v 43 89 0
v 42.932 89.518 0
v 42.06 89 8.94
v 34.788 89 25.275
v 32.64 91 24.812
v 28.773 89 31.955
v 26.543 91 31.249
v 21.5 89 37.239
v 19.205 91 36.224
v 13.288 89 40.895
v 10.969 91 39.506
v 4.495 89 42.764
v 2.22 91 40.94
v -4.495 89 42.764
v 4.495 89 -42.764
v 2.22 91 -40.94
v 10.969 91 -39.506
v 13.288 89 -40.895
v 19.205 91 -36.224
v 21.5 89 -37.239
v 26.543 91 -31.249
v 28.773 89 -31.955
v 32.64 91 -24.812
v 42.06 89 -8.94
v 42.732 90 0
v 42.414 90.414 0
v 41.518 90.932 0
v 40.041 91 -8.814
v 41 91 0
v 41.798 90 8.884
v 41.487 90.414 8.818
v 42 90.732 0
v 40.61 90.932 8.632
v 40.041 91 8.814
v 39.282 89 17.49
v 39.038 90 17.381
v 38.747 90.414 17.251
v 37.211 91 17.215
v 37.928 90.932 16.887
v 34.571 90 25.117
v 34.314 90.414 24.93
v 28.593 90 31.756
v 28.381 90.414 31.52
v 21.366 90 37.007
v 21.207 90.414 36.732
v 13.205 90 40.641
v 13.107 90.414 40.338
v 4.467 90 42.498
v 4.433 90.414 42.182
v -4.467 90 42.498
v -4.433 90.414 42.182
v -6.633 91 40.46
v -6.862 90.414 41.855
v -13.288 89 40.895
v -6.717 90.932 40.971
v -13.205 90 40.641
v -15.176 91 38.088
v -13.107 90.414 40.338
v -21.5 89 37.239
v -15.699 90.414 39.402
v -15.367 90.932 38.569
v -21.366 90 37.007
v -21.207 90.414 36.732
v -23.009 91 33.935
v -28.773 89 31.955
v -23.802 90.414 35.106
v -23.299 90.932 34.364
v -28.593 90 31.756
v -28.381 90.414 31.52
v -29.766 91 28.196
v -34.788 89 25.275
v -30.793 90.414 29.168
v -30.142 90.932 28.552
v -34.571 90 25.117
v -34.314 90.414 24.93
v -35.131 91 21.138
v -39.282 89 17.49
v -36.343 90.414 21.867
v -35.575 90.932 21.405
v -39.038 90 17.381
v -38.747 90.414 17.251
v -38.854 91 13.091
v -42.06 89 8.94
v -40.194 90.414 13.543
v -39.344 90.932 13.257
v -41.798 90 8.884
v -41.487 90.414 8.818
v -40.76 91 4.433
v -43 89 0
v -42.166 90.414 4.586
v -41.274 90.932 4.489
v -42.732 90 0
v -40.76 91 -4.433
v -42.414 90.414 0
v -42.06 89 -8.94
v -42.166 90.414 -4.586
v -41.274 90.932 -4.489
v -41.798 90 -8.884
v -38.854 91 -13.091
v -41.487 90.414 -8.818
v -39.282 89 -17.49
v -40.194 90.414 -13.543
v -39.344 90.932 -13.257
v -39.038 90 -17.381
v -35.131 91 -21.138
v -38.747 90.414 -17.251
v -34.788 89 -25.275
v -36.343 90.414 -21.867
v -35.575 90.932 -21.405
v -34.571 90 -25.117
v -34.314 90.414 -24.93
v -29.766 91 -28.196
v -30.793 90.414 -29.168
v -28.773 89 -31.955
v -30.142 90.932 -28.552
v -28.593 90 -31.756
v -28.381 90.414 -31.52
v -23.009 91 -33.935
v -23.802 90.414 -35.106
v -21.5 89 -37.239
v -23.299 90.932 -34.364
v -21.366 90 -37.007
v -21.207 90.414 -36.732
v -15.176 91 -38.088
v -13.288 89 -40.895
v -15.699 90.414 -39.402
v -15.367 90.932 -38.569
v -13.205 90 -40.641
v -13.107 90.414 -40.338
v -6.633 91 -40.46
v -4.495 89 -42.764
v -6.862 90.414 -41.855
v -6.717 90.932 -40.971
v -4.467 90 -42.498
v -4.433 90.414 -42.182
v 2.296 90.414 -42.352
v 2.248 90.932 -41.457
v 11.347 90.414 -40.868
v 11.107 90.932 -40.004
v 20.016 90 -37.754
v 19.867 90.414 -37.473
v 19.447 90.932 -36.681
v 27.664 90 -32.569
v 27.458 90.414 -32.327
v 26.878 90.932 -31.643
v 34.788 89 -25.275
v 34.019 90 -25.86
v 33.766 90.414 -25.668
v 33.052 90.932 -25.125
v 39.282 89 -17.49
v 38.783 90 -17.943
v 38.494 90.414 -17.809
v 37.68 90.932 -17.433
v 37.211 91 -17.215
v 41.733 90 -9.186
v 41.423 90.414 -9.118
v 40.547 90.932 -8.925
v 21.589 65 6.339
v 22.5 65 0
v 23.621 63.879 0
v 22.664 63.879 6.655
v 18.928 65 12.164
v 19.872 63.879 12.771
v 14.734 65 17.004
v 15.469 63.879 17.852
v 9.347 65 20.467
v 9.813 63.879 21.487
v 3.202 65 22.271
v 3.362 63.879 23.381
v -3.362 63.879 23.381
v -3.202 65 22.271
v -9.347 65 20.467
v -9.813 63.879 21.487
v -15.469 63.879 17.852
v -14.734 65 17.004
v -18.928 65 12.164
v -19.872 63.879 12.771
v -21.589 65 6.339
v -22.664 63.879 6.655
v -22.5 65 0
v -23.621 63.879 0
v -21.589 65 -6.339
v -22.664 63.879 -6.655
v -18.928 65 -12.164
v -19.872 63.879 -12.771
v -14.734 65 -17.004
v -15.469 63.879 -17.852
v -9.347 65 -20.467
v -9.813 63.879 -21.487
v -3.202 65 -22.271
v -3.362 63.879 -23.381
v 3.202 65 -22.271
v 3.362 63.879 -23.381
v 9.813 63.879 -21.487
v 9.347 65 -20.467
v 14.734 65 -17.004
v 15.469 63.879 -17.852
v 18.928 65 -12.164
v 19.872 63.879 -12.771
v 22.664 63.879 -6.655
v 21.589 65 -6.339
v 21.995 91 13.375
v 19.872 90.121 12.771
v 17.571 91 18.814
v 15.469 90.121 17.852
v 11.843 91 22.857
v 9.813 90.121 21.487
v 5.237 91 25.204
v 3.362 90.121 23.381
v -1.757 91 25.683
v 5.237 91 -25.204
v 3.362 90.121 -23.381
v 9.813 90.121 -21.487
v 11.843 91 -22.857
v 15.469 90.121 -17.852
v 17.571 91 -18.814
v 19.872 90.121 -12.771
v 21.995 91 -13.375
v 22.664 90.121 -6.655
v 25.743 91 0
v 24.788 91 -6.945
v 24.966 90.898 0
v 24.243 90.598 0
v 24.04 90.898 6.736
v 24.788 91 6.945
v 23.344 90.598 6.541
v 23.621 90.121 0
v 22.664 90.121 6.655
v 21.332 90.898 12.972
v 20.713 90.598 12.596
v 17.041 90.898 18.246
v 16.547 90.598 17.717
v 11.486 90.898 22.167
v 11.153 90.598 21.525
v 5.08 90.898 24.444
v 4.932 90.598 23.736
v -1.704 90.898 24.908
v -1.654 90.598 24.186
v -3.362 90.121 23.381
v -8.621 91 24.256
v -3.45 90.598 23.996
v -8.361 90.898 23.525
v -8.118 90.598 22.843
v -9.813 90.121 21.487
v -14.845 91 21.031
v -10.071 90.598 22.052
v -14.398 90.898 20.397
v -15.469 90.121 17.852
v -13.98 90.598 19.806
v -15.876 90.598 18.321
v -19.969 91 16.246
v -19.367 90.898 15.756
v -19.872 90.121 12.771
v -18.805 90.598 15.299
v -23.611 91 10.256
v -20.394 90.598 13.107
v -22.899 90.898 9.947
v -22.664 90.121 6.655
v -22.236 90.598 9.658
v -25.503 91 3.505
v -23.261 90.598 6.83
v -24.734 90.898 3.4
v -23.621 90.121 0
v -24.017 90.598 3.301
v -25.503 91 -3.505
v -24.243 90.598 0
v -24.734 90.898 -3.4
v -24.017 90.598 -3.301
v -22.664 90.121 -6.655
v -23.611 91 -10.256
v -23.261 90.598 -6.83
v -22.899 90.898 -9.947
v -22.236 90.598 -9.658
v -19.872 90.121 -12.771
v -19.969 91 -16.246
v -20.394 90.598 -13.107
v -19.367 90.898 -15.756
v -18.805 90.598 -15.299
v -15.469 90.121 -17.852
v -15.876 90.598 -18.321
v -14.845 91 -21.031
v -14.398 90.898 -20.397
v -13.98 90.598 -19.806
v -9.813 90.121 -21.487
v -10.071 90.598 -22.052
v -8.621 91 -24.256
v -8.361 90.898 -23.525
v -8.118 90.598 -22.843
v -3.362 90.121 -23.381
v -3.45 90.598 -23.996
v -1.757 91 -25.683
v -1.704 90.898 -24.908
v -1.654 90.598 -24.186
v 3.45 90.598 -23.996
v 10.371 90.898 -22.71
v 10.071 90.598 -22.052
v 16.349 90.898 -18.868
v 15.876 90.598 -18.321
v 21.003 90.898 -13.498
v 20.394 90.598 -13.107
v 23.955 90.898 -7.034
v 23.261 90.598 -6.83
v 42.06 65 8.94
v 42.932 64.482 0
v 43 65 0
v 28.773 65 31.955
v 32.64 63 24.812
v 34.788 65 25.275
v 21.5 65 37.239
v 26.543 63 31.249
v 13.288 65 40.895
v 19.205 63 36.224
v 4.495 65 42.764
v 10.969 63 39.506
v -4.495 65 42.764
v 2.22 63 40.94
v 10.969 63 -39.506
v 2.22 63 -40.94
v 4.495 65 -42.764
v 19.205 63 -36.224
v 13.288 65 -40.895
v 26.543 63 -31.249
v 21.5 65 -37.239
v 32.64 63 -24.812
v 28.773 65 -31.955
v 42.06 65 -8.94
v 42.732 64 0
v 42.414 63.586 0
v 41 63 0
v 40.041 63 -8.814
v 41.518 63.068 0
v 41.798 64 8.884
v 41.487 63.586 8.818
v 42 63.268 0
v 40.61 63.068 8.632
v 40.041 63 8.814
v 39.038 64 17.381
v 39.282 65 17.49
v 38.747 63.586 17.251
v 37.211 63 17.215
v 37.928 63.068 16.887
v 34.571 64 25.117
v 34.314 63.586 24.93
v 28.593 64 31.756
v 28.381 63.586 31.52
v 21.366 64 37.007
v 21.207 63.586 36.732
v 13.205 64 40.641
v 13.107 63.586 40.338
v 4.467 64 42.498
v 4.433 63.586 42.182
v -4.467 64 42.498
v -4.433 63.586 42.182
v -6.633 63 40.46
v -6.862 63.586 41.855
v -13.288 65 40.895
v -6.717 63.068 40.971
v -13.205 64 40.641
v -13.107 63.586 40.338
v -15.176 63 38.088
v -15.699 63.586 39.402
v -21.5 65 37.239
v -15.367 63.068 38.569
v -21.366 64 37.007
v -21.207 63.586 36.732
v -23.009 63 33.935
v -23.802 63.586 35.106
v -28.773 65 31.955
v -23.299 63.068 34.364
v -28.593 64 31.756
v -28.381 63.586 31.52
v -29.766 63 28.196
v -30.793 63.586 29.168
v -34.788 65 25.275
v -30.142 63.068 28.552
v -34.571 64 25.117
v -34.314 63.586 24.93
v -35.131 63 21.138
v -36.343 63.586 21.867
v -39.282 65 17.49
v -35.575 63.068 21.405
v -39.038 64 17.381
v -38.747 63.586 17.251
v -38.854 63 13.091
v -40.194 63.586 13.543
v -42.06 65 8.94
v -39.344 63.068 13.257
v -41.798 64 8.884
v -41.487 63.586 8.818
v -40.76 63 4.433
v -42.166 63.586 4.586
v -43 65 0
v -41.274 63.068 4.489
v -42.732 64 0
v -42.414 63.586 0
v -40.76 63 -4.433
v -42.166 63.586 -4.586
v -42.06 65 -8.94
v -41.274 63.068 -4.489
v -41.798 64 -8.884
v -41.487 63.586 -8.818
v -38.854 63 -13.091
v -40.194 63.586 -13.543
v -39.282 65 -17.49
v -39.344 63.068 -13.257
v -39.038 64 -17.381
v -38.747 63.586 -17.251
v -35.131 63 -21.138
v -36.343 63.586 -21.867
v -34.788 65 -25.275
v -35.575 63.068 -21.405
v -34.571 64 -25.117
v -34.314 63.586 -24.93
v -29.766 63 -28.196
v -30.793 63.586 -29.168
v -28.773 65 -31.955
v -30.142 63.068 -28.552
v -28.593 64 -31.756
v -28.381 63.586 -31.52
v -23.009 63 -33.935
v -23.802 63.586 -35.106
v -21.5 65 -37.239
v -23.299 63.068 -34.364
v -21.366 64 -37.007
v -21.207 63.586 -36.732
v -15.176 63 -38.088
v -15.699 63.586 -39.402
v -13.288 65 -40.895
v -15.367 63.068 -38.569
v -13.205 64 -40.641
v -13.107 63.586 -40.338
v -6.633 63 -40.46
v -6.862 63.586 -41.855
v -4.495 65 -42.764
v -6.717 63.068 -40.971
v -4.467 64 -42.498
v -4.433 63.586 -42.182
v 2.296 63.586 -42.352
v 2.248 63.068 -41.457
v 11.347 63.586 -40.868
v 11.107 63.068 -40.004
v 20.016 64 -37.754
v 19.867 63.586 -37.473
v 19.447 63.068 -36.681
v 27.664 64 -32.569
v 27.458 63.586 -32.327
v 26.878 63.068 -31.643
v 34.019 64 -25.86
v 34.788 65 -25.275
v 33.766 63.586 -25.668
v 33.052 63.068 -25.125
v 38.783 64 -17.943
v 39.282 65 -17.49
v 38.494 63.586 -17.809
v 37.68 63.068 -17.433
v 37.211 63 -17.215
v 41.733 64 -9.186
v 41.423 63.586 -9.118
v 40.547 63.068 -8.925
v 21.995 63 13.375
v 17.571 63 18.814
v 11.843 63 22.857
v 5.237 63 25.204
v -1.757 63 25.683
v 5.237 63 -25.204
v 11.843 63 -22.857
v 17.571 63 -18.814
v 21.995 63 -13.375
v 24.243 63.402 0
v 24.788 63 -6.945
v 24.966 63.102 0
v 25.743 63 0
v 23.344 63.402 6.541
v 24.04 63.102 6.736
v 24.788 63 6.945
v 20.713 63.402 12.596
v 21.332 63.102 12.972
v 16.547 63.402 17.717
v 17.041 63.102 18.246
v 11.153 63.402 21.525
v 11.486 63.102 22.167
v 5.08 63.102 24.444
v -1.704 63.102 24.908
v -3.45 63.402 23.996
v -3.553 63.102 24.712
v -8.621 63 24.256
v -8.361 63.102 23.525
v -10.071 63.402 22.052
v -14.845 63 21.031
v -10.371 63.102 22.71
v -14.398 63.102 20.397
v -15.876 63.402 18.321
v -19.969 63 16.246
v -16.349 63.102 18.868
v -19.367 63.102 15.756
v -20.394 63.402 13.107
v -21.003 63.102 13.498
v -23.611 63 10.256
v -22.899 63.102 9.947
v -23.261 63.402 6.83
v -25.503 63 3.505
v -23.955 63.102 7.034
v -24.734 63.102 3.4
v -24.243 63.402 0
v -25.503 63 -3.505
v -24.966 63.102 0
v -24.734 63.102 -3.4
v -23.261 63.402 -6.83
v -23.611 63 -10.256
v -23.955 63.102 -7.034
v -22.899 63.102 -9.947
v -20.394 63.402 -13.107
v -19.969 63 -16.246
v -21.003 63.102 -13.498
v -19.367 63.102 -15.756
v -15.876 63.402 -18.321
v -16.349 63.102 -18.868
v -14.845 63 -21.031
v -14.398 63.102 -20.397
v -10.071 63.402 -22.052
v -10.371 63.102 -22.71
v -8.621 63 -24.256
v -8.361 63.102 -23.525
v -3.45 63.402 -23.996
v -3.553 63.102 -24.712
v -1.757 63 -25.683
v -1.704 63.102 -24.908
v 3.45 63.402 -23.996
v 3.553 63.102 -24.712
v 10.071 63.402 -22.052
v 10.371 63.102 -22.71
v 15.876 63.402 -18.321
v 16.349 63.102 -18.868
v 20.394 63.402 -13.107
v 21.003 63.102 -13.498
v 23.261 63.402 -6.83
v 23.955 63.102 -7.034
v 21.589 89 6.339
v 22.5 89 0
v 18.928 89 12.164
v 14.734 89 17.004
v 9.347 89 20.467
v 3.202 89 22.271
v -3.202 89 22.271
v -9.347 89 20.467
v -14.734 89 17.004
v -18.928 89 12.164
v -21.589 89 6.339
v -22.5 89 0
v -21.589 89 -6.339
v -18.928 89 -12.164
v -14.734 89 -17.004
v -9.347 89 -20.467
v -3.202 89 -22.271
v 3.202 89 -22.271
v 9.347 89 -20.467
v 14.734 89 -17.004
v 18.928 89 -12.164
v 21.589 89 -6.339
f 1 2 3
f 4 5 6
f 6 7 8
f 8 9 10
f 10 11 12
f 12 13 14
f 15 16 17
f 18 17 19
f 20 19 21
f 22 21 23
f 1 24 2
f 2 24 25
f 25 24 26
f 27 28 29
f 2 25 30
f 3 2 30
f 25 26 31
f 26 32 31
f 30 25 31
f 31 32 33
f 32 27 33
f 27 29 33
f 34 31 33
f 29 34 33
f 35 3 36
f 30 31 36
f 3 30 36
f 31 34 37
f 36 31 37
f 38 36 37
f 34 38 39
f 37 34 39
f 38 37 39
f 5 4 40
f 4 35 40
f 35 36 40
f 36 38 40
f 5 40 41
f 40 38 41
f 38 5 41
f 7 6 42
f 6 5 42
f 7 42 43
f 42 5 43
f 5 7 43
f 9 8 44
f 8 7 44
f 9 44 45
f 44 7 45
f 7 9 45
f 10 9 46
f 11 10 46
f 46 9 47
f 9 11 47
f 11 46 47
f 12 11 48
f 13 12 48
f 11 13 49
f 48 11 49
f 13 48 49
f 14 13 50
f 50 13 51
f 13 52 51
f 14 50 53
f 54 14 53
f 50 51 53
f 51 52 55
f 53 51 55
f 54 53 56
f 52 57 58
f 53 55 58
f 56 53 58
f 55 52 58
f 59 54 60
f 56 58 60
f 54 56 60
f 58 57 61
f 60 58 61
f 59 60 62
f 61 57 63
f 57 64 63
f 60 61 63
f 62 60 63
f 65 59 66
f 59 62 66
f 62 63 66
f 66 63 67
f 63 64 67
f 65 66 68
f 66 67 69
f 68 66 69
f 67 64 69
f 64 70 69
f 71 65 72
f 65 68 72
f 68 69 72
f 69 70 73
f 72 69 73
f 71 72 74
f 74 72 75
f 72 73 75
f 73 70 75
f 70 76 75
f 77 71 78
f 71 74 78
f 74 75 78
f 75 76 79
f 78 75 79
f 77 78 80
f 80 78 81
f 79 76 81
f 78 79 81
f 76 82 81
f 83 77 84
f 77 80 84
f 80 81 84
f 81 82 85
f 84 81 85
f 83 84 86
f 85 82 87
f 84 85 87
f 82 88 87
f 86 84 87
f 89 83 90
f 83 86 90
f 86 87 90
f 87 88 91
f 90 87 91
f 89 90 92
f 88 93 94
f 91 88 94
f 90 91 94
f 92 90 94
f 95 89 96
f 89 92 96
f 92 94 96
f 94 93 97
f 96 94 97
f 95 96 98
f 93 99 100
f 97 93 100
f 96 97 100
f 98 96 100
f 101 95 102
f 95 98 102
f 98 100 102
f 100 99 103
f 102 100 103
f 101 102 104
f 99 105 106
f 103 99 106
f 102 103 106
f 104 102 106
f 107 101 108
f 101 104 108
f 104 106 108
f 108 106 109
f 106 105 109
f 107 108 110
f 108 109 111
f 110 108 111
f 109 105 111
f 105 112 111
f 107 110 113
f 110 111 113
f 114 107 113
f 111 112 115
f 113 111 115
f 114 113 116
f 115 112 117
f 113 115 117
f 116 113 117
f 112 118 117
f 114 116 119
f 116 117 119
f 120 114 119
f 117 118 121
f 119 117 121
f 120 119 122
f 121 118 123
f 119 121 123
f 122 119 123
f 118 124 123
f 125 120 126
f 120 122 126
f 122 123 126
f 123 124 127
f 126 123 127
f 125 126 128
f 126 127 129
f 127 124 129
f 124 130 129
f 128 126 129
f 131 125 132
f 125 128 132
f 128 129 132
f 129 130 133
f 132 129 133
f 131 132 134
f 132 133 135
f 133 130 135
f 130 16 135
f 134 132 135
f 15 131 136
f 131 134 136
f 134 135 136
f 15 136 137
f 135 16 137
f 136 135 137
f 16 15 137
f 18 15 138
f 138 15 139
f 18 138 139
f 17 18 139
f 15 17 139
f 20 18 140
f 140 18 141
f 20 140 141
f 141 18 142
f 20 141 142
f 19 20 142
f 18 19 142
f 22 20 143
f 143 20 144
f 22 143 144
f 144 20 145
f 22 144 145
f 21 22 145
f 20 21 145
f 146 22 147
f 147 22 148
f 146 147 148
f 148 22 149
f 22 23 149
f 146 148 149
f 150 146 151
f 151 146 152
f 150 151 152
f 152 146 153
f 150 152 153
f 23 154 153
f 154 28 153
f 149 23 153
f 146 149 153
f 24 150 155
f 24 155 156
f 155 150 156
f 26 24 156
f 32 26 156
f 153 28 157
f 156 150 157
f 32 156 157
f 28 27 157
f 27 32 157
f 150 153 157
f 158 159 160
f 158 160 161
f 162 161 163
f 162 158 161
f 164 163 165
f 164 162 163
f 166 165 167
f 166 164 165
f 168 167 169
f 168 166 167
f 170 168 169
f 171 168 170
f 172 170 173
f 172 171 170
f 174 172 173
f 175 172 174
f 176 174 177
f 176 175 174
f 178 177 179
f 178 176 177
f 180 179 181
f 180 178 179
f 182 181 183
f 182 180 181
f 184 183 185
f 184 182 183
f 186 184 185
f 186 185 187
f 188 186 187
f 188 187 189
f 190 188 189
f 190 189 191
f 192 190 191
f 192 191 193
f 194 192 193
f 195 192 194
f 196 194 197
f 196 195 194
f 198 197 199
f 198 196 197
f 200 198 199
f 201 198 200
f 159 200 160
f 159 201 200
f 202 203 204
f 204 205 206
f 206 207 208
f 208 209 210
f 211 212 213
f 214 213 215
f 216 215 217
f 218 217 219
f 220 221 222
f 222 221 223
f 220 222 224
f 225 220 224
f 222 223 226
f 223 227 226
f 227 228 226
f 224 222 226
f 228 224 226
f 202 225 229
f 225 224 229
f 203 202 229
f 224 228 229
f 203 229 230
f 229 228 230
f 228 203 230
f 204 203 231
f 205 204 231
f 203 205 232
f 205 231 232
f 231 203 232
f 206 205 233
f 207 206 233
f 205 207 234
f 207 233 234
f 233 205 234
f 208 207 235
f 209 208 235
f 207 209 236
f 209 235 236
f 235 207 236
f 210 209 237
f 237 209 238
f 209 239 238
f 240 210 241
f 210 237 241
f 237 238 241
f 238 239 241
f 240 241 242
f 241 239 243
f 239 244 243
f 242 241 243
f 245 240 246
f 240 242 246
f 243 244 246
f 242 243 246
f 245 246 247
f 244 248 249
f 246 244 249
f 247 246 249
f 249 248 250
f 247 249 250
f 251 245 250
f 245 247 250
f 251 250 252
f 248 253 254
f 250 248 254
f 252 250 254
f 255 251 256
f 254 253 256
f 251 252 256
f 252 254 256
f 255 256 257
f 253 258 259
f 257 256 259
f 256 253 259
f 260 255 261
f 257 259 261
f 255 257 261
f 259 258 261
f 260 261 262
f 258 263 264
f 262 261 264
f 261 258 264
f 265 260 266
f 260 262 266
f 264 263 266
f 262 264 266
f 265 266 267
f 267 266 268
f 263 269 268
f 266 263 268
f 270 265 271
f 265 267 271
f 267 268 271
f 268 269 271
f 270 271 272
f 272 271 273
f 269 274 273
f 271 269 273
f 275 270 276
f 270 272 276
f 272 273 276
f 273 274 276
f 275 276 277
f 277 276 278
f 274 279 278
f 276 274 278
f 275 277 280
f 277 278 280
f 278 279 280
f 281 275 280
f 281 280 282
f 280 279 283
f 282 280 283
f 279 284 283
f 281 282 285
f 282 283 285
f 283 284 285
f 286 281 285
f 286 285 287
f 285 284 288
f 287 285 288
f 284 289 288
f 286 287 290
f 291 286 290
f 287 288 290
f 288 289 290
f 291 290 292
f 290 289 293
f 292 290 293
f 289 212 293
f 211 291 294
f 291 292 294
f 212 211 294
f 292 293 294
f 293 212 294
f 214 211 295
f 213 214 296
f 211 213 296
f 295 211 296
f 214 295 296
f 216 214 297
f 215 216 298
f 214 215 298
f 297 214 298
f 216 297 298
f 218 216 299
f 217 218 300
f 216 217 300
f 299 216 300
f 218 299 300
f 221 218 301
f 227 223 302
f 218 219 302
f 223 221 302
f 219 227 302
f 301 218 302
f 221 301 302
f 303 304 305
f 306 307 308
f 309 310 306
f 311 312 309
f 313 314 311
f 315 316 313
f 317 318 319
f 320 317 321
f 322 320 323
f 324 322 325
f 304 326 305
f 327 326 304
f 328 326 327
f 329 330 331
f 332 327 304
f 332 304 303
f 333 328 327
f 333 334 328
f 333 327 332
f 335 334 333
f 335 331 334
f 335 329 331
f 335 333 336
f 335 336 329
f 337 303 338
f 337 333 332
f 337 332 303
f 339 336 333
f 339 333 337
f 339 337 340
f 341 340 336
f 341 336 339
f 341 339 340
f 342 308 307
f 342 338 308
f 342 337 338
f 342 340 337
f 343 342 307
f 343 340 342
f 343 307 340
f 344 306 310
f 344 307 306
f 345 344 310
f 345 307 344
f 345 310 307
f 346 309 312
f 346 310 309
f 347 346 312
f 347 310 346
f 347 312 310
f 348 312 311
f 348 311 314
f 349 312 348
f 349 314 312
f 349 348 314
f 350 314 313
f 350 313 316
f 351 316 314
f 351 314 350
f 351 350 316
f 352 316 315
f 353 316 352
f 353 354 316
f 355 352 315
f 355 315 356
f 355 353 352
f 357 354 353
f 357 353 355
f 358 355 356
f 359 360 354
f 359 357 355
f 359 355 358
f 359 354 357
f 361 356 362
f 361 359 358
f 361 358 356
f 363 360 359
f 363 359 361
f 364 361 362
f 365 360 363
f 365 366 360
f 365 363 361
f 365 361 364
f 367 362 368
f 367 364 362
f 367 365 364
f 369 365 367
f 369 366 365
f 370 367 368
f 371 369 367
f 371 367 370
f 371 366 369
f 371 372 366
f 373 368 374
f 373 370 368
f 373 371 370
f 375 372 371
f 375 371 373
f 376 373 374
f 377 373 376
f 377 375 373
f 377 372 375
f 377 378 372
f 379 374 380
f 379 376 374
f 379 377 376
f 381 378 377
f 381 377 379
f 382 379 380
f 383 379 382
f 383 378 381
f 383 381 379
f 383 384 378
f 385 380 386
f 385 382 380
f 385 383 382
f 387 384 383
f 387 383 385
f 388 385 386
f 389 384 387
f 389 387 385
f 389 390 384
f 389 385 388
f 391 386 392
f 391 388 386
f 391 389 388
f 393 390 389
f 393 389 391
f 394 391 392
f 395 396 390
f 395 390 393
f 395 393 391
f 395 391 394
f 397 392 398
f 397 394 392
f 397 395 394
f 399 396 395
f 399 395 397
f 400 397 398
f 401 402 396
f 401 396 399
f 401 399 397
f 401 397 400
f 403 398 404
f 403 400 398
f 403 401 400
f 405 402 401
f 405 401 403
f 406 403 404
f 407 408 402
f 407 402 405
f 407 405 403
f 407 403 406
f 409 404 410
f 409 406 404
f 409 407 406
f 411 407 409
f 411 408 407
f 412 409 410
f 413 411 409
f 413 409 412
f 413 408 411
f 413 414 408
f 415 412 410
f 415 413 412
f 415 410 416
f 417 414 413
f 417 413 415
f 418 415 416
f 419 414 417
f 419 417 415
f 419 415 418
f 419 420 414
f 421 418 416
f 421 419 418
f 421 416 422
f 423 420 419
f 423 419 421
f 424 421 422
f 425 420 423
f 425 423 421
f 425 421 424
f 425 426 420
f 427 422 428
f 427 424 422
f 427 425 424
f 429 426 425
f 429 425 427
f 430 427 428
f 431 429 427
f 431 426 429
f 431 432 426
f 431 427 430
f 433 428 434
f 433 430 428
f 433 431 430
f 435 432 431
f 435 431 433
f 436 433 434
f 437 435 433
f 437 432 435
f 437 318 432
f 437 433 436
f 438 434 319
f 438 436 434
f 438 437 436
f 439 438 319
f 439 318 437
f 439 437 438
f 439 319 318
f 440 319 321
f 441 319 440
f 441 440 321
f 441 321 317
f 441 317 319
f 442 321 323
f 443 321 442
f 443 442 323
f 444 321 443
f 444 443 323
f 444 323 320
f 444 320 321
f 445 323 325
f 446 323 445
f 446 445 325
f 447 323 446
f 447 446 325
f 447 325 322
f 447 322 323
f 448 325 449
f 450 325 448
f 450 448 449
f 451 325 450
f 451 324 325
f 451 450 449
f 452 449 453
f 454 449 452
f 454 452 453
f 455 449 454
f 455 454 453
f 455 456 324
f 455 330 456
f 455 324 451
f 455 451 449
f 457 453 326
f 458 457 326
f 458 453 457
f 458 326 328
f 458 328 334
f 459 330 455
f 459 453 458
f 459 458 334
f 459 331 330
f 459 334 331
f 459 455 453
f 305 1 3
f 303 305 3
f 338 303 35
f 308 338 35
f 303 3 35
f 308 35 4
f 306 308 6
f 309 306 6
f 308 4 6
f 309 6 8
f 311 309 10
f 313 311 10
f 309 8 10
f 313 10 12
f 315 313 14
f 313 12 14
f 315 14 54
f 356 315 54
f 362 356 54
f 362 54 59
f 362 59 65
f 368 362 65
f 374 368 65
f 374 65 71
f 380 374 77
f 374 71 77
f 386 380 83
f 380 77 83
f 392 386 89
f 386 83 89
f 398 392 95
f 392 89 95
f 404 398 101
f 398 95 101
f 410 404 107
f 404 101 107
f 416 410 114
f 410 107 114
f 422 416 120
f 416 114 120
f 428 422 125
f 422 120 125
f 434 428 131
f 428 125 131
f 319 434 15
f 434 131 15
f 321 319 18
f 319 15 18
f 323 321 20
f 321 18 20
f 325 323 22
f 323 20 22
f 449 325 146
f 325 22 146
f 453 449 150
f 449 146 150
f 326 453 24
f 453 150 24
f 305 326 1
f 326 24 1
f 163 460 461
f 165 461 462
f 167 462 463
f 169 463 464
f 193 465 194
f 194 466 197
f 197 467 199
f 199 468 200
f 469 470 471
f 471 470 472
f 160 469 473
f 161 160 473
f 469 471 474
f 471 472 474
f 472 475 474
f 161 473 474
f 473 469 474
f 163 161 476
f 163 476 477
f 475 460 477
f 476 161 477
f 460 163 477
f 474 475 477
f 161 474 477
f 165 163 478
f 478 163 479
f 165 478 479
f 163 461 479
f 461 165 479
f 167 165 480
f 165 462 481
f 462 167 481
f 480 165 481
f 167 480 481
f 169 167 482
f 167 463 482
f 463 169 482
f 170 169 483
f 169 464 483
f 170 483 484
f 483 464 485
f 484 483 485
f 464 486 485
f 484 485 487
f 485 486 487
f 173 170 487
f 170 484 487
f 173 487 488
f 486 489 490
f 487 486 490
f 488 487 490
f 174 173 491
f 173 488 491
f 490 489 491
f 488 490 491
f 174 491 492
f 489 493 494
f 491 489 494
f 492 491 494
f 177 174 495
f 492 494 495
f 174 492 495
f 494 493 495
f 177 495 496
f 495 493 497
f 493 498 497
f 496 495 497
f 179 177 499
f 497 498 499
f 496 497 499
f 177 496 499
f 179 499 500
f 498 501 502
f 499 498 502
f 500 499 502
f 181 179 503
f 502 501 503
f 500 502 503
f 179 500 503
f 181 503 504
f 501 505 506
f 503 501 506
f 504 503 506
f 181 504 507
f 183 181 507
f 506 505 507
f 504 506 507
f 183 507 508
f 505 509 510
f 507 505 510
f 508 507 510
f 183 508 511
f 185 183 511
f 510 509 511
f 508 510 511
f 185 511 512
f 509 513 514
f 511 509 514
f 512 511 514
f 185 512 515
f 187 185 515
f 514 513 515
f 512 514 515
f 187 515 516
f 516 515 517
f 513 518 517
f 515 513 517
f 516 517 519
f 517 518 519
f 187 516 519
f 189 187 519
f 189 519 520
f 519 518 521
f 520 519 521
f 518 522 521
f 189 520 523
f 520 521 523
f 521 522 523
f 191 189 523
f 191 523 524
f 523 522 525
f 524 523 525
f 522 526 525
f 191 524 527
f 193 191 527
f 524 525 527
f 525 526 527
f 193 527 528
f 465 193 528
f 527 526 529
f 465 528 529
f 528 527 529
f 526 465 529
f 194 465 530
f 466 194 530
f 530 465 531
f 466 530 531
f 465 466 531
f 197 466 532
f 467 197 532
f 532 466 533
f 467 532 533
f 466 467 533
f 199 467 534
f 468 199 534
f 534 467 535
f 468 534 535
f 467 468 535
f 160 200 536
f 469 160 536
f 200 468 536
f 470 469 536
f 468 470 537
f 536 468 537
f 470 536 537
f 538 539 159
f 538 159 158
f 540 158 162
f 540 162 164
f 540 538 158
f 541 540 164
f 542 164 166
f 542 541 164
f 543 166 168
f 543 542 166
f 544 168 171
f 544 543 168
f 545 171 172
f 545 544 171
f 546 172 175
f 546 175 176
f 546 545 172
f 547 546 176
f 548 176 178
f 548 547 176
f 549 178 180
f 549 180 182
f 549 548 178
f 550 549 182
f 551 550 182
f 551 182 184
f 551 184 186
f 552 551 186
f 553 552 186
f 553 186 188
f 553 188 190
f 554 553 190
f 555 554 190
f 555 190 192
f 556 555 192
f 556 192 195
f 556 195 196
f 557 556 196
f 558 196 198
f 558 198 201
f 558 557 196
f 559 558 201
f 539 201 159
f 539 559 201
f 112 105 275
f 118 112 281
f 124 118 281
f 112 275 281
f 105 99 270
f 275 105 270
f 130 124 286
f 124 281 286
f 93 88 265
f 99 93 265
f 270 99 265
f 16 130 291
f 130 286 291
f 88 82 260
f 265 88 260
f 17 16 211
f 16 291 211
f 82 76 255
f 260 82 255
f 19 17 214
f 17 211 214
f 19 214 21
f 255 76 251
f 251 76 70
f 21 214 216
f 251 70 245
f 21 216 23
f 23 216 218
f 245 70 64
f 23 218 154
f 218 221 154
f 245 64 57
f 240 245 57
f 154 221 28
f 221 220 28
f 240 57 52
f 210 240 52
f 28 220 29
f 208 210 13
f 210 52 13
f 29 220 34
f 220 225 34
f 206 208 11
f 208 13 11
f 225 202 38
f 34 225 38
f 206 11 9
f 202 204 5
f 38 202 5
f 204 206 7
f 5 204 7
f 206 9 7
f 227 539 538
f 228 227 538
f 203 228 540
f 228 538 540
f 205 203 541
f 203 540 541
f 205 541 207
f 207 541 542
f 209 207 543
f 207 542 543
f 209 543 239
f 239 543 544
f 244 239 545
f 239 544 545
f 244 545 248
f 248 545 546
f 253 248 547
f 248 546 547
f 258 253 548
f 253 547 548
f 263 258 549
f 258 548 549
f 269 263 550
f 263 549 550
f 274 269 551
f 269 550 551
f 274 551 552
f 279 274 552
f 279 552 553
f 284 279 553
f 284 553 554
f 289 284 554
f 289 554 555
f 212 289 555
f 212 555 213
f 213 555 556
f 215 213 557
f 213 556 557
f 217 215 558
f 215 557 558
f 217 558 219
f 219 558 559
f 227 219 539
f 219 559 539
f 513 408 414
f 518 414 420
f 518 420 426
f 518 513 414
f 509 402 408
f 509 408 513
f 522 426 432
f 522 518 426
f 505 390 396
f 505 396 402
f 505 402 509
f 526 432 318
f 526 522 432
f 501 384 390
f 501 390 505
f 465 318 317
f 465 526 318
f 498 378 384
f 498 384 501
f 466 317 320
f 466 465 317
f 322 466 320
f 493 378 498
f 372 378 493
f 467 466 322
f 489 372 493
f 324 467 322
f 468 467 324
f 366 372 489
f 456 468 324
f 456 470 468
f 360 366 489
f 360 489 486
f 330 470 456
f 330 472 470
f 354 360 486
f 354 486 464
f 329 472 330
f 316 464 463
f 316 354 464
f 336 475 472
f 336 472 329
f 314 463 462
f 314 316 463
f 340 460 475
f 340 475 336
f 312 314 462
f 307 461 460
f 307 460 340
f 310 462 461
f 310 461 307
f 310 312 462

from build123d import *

# Parameters (mm, degrees)
CYLINDER052_R     = 22.5
CYLINDER052_DEPTH = 28
CYLINDER051_R     = 43
CYLINDER051_DEPTH = 28
FILLET003_R       = 2
CHAMFER001_SIZE   = 2
FILLET002_R       = 3


with BuildPart() as cylinder052:
    # Cylinder052 → Cylinder052 (new body)
    with BuildSketch(Plane.XZ):
        Circle(CYLINDER052_R)
    extrude(amount=CYLINDER052_DEPTH)


with BuildPart() as wheel_wide_right:
    # Cylinder051 → Cylinder051 (new body)
    with BuildSketch(Plane.XZ):
        Circle(CYLINDER051_R)
    extrude(amount=CYLINDER051_DEPTH)

    # Cut020: cut Cylinder052
    add(cylinder052.part, mode=Mode.SUBTRACT)

    # Fillet003
    fillet003_edges = [wheel_wide_right.edges().sort_by_distance(p)[0] for p in [
        (-43, -28, 0),
        (-43, 0, 0),
    ]]
    fillet(fillet003_edges, radius=FILLET003_R)

    # Chamfer001
    chamfer001_edges = [wheel_wide_right.edges().sort_by_distance(p)[0] for p in [
        (-22.5, 0, 0),
        (-22.5, -28, 0),
    ]]
    chamfer(chamfer001_edges, length=CHAMFER001_SIZE)

    # Fillet002
    fillet002_edges = [wheel_wide_right.edges().sort_by_distance(p)[0] for p in [
        (-24.5, 0, 0),
        (-24.5, -28, 0),
    ]]
    fillet(fillet002_edges, radius=FILLET002_R)


with BuildPart() as wheel_wide_right_1:
    # Fillet002 placement: moved
    add(wheel_wide_right.part.moved(Location((0, 91, 0))))


solid = wheel_wide_right_1.part
